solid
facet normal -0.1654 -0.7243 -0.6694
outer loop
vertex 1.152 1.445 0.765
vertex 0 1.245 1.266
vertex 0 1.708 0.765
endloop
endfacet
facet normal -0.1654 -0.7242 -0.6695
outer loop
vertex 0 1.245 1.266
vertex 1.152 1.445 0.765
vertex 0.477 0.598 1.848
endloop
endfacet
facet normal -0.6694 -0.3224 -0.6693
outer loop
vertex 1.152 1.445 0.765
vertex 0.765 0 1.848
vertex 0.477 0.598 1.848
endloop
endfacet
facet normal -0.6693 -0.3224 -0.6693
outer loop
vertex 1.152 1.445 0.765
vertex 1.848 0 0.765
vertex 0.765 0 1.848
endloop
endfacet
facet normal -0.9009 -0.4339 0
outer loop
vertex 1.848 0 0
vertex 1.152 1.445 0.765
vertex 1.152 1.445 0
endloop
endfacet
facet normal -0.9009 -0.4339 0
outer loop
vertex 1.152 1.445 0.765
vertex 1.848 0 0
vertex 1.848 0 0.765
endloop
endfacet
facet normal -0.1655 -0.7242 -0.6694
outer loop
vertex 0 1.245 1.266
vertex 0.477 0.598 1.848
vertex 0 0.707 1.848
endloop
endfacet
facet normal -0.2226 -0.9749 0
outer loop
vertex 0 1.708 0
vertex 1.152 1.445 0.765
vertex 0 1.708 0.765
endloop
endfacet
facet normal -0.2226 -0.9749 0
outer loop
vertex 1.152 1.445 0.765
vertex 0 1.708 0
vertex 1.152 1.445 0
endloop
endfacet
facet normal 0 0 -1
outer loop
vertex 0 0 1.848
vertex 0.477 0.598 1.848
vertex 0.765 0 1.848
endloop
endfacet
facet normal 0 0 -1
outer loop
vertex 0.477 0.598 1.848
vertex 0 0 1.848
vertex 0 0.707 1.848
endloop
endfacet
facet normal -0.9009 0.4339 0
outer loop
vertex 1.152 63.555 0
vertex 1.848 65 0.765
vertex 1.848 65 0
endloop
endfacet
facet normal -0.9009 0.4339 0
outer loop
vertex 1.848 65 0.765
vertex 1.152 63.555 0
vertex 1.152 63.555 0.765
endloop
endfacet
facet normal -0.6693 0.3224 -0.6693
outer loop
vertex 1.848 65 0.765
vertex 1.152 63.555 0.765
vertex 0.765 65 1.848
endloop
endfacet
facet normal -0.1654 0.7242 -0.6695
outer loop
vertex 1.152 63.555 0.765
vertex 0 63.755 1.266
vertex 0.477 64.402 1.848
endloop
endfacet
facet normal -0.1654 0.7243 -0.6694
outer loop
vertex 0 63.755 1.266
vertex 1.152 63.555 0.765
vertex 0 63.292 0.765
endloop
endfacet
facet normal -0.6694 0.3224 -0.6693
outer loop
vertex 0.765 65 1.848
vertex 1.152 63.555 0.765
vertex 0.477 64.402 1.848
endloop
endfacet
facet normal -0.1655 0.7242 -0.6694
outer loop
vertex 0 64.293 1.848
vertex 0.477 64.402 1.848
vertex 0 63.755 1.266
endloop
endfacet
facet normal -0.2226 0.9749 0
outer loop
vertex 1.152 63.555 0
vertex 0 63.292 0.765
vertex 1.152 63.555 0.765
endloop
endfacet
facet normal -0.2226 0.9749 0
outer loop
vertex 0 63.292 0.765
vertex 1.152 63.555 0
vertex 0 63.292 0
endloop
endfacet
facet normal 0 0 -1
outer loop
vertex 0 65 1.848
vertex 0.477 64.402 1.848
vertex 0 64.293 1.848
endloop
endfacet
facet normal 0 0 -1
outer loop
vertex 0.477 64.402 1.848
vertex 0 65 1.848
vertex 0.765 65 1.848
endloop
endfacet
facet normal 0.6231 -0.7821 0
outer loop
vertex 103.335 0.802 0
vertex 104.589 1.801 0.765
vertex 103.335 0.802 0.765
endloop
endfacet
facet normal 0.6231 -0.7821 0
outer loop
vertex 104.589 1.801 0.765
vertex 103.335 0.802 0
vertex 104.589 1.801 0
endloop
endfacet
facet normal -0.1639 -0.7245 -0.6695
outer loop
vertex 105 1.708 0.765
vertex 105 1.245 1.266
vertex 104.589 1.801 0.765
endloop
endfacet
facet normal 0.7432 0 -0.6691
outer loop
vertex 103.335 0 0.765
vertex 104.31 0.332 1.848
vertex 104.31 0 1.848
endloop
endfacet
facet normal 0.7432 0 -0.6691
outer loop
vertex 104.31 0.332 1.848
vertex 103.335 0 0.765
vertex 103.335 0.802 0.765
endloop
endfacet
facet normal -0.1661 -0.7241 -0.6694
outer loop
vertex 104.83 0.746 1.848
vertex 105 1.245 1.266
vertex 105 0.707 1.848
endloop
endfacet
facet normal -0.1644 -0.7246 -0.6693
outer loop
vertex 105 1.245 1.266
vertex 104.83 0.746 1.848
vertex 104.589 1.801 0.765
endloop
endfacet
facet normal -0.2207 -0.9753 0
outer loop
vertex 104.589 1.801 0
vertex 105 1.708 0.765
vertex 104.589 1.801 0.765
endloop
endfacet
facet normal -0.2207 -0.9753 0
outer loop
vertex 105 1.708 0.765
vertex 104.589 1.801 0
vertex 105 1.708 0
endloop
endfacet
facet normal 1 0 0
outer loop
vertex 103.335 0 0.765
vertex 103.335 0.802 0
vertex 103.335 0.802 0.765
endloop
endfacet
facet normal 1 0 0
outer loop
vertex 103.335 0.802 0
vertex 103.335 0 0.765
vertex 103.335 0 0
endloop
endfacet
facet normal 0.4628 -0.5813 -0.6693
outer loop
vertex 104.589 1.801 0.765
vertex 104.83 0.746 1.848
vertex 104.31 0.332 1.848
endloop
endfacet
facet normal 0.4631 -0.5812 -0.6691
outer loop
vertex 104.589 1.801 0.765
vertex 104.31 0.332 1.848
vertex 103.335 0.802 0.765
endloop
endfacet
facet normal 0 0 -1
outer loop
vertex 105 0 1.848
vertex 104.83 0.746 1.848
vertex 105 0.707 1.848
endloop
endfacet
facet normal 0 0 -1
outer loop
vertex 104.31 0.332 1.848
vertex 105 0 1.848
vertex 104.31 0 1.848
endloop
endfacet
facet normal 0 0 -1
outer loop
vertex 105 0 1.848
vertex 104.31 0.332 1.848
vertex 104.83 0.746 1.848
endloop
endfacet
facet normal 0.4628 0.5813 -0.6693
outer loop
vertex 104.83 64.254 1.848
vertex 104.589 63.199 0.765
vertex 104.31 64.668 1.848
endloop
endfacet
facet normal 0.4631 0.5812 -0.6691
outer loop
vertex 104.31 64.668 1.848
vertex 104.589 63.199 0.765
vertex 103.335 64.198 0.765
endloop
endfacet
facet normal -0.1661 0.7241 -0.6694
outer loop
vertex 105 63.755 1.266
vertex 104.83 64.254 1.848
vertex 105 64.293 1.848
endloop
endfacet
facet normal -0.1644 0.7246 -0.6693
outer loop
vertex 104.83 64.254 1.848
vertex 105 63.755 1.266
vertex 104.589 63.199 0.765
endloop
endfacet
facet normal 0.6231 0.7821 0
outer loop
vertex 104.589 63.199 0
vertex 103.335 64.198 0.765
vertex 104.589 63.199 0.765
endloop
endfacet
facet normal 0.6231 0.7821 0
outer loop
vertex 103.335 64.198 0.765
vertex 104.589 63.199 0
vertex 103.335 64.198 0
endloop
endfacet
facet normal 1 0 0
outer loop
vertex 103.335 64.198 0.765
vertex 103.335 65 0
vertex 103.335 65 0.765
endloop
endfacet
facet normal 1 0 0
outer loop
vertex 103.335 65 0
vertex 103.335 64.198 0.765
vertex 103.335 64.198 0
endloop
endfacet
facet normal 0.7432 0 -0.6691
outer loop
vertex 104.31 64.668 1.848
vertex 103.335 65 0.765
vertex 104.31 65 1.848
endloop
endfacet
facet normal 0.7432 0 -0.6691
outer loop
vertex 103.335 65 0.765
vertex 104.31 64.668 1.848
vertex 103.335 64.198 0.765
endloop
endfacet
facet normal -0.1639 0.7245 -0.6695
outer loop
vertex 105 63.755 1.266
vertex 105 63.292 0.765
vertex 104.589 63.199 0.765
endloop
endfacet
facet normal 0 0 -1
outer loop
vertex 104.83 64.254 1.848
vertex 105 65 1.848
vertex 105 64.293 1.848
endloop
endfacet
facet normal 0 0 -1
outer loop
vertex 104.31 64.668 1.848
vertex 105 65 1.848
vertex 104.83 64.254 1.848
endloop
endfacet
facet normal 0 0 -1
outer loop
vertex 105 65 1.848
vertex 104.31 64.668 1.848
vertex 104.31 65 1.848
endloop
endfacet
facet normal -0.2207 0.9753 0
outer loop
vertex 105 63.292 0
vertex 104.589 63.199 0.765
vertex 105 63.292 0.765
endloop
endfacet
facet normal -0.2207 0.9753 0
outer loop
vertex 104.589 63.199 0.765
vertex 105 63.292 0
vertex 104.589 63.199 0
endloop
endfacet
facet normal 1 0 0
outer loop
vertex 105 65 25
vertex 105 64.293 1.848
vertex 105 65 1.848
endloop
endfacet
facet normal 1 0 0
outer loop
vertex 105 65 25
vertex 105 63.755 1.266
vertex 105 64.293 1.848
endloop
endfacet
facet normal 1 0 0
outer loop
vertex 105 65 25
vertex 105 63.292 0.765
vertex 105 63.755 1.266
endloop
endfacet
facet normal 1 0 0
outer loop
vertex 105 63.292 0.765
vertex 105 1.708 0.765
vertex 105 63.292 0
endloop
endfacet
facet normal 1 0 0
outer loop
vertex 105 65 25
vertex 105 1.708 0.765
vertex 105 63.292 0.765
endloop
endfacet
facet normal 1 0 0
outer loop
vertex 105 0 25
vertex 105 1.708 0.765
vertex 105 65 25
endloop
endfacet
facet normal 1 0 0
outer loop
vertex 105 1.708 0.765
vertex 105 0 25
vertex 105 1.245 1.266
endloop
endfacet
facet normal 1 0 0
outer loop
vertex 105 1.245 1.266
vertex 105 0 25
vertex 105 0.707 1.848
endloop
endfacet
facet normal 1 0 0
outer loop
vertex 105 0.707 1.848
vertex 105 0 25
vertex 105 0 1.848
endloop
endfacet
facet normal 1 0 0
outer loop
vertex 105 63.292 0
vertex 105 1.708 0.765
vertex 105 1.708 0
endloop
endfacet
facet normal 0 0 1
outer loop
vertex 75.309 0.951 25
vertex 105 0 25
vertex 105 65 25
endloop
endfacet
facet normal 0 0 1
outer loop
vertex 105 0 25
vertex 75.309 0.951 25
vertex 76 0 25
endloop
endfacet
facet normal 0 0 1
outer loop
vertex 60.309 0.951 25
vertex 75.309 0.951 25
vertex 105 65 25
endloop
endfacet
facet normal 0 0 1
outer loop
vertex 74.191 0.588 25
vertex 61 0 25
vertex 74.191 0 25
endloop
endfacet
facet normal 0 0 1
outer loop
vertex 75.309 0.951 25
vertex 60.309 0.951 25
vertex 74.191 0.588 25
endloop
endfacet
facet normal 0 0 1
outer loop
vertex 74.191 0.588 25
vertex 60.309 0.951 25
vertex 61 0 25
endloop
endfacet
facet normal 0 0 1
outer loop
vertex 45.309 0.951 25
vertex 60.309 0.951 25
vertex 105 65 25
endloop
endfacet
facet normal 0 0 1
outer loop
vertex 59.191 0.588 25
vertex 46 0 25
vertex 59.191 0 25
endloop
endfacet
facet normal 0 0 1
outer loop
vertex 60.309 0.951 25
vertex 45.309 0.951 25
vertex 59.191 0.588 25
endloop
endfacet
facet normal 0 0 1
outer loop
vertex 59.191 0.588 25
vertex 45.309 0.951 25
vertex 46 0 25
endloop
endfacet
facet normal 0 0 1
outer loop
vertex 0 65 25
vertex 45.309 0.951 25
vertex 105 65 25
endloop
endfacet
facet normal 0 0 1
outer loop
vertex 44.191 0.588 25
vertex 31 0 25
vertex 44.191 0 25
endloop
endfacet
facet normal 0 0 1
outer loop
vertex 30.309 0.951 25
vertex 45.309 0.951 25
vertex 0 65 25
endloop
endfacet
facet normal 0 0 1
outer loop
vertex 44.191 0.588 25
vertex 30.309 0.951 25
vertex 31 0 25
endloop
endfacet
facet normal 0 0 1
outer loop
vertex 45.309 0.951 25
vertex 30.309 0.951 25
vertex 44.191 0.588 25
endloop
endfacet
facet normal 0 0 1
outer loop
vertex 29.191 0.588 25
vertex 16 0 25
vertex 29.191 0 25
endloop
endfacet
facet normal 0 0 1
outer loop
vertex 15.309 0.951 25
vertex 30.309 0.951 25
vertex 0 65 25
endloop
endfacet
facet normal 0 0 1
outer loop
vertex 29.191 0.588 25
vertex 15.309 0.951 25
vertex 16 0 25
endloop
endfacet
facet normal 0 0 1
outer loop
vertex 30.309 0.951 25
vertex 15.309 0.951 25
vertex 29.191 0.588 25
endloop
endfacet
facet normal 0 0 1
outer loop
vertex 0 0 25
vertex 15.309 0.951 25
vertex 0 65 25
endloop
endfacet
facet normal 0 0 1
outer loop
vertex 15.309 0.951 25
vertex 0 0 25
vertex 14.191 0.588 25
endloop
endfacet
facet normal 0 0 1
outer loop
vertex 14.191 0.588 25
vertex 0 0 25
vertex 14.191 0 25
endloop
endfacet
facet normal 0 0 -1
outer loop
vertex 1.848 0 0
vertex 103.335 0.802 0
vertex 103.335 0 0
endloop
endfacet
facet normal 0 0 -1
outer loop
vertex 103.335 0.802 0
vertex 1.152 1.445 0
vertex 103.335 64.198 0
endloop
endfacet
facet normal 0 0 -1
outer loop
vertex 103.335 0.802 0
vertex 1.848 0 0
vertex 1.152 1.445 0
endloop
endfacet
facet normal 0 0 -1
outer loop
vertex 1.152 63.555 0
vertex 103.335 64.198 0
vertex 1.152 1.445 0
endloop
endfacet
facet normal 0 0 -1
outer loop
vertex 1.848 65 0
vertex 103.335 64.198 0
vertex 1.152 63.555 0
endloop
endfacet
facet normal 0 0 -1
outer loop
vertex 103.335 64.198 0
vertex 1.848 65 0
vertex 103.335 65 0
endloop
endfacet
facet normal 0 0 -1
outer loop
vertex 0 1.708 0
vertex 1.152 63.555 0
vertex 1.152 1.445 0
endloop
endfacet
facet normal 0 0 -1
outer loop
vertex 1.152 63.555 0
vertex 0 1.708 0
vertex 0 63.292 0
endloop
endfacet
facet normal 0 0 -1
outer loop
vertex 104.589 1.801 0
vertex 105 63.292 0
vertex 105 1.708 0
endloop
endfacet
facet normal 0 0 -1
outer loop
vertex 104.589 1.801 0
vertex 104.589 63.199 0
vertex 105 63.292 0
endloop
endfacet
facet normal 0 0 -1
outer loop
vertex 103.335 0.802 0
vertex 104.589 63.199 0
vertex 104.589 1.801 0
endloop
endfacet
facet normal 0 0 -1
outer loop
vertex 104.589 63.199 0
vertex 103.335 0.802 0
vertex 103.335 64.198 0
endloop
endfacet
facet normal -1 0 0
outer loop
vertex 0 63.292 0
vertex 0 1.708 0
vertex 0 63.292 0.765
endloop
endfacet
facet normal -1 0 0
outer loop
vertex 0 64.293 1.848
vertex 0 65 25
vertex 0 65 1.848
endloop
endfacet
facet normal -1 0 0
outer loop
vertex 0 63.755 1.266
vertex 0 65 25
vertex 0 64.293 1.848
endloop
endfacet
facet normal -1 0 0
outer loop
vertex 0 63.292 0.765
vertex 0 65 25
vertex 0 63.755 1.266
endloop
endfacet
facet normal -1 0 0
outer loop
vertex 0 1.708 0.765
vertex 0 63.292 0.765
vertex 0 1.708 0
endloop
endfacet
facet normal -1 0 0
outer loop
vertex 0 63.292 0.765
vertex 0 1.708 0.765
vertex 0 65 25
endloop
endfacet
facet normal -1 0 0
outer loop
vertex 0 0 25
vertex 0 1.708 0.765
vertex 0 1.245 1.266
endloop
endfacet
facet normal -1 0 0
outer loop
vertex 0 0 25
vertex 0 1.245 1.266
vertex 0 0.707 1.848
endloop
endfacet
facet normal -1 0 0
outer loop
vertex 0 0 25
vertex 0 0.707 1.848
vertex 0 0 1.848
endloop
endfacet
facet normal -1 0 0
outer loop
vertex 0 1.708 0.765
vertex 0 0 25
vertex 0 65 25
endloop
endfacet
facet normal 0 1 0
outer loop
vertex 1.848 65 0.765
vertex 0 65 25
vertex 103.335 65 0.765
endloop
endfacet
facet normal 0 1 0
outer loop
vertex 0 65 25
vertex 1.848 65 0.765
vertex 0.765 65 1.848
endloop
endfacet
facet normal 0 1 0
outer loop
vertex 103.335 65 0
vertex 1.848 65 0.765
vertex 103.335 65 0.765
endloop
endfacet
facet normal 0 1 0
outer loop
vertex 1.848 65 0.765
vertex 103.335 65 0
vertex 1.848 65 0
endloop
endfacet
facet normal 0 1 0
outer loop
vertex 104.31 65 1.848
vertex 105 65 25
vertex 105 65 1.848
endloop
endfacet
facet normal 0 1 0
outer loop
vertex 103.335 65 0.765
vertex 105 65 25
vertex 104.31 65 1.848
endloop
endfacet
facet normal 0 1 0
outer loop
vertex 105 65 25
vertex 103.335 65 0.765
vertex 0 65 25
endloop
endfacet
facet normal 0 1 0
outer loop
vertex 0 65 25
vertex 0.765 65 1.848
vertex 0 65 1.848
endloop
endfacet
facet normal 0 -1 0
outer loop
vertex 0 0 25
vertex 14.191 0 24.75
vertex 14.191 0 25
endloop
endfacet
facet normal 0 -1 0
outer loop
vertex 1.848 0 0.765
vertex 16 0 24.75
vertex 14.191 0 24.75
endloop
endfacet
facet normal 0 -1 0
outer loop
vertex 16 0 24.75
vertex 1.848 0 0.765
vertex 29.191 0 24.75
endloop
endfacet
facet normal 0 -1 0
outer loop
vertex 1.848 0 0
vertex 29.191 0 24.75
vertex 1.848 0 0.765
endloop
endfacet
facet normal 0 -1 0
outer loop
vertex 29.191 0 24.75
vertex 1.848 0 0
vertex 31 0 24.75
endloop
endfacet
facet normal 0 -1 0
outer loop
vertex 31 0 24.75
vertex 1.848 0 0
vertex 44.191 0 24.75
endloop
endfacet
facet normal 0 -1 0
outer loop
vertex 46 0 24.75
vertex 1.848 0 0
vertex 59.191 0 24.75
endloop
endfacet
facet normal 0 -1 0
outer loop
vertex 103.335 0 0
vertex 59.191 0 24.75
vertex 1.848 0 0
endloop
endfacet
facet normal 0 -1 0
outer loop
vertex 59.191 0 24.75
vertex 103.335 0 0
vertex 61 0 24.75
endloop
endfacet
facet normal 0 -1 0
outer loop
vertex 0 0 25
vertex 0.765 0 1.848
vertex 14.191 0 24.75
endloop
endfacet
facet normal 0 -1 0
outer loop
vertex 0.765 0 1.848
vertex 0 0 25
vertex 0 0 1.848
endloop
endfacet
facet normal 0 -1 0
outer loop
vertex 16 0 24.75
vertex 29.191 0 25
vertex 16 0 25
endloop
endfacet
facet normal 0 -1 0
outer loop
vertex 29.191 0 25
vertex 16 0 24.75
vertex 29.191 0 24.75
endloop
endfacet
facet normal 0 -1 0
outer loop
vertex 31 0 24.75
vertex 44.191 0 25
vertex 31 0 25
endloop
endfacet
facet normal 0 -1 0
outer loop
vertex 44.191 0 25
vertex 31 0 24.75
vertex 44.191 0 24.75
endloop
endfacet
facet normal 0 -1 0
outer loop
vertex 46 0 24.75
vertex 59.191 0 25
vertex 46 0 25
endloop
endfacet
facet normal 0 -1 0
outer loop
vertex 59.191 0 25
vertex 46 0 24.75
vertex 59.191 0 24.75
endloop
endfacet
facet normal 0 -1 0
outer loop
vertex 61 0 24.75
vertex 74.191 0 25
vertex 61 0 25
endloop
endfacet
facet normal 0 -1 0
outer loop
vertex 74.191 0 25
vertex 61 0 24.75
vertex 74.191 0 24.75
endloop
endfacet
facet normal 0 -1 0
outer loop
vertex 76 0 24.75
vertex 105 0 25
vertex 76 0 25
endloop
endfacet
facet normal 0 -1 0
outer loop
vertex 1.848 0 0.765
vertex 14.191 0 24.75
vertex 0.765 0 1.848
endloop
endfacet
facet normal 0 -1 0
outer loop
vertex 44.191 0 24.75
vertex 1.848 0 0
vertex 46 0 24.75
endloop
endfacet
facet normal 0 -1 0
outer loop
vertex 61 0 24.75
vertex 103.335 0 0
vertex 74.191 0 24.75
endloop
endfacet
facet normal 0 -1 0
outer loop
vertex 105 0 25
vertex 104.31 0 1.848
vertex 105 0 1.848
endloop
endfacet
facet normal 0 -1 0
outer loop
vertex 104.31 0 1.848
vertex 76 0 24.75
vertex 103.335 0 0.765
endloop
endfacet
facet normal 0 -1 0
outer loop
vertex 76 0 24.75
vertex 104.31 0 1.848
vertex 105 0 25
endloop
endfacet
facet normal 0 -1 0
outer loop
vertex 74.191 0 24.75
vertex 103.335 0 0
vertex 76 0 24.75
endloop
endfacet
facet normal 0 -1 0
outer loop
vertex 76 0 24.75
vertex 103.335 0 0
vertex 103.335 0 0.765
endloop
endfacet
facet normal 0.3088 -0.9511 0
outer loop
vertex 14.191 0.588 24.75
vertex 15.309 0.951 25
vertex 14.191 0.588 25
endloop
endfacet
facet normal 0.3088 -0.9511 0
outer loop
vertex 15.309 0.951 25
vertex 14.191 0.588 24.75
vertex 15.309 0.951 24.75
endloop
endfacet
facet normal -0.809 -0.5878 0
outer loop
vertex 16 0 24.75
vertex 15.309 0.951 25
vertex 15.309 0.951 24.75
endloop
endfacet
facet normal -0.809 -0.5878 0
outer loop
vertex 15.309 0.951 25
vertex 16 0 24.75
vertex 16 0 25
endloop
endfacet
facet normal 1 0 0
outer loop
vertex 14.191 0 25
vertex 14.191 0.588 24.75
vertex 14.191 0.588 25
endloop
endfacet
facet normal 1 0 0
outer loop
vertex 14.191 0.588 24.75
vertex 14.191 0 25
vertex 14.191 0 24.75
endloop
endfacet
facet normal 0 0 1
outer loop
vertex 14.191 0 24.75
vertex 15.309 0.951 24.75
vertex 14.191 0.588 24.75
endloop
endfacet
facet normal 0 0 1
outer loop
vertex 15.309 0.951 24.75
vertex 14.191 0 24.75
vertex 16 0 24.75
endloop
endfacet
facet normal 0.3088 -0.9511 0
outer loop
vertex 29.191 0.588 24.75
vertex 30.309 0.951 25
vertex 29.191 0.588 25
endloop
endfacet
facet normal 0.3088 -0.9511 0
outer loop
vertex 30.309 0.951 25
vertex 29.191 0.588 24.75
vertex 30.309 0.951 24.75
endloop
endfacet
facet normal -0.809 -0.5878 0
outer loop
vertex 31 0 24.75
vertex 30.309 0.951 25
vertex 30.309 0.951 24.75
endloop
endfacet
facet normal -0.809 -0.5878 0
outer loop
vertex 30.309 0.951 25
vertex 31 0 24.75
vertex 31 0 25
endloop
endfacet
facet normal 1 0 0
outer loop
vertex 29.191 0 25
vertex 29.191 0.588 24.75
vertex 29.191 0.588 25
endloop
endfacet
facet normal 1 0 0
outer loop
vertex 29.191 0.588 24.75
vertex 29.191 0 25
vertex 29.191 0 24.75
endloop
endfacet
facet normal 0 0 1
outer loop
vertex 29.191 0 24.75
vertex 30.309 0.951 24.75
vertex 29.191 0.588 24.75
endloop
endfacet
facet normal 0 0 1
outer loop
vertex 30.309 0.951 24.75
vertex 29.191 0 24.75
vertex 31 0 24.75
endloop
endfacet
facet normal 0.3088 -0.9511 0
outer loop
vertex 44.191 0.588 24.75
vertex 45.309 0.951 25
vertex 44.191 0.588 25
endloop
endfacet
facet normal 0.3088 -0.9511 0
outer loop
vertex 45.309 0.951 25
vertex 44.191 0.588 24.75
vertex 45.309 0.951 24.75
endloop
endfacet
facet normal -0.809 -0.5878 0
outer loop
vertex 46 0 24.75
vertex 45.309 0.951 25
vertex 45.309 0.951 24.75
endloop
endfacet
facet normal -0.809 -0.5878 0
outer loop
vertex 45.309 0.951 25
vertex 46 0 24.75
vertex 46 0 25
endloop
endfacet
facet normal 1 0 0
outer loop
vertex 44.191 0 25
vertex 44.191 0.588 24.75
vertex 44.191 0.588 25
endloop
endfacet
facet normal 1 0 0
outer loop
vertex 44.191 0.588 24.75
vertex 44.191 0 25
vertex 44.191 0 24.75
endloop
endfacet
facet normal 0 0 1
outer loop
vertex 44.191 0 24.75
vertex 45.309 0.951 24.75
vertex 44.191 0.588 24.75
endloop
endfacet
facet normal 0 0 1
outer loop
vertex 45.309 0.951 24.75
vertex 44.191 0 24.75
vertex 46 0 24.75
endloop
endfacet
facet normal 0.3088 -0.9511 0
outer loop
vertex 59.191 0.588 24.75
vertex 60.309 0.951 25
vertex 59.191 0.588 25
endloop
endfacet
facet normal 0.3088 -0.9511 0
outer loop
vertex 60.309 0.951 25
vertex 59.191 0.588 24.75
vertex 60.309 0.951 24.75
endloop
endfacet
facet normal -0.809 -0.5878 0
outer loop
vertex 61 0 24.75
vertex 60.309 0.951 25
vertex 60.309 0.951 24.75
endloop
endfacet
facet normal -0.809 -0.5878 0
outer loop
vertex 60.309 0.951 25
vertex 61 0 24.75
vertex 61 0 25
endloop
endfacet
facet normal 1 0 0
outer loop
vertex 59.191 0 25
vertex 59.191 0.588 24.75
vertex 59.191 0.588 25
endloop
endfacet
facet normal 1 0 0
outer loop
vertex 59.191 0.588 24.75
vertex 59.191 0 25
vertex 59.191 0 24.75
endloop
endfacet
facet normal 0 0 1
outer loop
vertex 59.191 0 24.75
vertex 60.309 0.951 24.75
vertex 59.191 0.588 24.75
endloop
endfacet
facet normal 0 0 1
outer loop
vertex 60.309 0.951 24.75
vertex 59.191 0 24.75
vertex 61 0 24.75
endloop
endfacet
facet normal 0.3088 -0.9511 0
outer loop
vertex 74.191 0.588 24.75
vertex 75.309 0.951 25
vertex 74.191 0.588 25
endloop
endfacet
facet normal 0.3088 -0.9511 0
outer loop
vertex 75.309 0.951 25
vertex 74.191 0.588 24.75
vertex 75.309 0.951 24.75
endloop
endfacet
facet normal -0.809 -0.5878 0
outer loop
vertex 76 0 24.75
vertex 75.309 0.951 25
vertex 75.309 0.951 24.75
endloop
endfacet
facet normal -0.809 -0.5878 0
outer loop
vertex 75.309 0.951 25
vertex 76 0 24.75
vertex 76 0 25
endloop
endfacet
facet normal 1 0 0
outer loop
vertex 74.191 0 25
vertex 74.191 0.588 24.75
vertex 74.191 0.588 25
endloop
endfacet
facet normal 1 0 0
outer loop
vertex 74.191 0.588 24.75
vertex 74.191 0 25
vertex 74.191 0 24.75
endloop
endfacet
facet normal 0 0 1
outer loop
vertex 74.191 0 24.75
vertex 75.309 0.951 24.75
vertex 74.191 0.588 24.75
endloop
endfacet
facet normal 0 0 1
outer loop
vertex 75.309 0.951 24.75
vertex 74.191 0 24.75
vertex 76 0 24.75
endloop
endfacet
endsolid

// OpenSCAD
// Main body dimensions
module main_body() {
    difference() {
        cube([105, 65, 25], center = false); // Main box
        filleted_corners(); // Add filleted corners
    }
}

// Filleted corners approximation
module filleted_corners() {
    for (x = [0, 105]) {
        for (y = [0, 65]) {
            translate([x, y, 0]) sphere(r = 2);
        }
    }
}

// USB port
module usb_port() {
    translate([65 / 2 - 7.25, -30, 25 / 2 - 0.75])
        cube([14.5, 6, 1.5]);
}

// DC port
module dc_port() {
    translate([65 / 2 - 10, -30, 25 / 2 - 0.75])
        cylinder(r = 5.5 / 2, h = 1.5, center = false);
}

// Switch
module switch_cutout() {
    translate([65 / 2 + 10, -30, 25 / 2 - 1])
        cube([6, 10, 2]);
}

// LED holes
module led_holes() {
    for (i = [0:4])
        translate([15 + i * 15, 0, 25 - 0.25])
            cylinder(r = 1, h = 0.5, center = false);
}

// Final model
difference() {
    main_body();
    usb_port();
    dc_port();
    switch_cutout();
    led_holes();
}

// Save STL programmatically
// This line is ignored in OpenSCAD GUI, but you can execute this in a terminal
// OpenSCAD CLI command: openscad -o battery.stl battery.scad
